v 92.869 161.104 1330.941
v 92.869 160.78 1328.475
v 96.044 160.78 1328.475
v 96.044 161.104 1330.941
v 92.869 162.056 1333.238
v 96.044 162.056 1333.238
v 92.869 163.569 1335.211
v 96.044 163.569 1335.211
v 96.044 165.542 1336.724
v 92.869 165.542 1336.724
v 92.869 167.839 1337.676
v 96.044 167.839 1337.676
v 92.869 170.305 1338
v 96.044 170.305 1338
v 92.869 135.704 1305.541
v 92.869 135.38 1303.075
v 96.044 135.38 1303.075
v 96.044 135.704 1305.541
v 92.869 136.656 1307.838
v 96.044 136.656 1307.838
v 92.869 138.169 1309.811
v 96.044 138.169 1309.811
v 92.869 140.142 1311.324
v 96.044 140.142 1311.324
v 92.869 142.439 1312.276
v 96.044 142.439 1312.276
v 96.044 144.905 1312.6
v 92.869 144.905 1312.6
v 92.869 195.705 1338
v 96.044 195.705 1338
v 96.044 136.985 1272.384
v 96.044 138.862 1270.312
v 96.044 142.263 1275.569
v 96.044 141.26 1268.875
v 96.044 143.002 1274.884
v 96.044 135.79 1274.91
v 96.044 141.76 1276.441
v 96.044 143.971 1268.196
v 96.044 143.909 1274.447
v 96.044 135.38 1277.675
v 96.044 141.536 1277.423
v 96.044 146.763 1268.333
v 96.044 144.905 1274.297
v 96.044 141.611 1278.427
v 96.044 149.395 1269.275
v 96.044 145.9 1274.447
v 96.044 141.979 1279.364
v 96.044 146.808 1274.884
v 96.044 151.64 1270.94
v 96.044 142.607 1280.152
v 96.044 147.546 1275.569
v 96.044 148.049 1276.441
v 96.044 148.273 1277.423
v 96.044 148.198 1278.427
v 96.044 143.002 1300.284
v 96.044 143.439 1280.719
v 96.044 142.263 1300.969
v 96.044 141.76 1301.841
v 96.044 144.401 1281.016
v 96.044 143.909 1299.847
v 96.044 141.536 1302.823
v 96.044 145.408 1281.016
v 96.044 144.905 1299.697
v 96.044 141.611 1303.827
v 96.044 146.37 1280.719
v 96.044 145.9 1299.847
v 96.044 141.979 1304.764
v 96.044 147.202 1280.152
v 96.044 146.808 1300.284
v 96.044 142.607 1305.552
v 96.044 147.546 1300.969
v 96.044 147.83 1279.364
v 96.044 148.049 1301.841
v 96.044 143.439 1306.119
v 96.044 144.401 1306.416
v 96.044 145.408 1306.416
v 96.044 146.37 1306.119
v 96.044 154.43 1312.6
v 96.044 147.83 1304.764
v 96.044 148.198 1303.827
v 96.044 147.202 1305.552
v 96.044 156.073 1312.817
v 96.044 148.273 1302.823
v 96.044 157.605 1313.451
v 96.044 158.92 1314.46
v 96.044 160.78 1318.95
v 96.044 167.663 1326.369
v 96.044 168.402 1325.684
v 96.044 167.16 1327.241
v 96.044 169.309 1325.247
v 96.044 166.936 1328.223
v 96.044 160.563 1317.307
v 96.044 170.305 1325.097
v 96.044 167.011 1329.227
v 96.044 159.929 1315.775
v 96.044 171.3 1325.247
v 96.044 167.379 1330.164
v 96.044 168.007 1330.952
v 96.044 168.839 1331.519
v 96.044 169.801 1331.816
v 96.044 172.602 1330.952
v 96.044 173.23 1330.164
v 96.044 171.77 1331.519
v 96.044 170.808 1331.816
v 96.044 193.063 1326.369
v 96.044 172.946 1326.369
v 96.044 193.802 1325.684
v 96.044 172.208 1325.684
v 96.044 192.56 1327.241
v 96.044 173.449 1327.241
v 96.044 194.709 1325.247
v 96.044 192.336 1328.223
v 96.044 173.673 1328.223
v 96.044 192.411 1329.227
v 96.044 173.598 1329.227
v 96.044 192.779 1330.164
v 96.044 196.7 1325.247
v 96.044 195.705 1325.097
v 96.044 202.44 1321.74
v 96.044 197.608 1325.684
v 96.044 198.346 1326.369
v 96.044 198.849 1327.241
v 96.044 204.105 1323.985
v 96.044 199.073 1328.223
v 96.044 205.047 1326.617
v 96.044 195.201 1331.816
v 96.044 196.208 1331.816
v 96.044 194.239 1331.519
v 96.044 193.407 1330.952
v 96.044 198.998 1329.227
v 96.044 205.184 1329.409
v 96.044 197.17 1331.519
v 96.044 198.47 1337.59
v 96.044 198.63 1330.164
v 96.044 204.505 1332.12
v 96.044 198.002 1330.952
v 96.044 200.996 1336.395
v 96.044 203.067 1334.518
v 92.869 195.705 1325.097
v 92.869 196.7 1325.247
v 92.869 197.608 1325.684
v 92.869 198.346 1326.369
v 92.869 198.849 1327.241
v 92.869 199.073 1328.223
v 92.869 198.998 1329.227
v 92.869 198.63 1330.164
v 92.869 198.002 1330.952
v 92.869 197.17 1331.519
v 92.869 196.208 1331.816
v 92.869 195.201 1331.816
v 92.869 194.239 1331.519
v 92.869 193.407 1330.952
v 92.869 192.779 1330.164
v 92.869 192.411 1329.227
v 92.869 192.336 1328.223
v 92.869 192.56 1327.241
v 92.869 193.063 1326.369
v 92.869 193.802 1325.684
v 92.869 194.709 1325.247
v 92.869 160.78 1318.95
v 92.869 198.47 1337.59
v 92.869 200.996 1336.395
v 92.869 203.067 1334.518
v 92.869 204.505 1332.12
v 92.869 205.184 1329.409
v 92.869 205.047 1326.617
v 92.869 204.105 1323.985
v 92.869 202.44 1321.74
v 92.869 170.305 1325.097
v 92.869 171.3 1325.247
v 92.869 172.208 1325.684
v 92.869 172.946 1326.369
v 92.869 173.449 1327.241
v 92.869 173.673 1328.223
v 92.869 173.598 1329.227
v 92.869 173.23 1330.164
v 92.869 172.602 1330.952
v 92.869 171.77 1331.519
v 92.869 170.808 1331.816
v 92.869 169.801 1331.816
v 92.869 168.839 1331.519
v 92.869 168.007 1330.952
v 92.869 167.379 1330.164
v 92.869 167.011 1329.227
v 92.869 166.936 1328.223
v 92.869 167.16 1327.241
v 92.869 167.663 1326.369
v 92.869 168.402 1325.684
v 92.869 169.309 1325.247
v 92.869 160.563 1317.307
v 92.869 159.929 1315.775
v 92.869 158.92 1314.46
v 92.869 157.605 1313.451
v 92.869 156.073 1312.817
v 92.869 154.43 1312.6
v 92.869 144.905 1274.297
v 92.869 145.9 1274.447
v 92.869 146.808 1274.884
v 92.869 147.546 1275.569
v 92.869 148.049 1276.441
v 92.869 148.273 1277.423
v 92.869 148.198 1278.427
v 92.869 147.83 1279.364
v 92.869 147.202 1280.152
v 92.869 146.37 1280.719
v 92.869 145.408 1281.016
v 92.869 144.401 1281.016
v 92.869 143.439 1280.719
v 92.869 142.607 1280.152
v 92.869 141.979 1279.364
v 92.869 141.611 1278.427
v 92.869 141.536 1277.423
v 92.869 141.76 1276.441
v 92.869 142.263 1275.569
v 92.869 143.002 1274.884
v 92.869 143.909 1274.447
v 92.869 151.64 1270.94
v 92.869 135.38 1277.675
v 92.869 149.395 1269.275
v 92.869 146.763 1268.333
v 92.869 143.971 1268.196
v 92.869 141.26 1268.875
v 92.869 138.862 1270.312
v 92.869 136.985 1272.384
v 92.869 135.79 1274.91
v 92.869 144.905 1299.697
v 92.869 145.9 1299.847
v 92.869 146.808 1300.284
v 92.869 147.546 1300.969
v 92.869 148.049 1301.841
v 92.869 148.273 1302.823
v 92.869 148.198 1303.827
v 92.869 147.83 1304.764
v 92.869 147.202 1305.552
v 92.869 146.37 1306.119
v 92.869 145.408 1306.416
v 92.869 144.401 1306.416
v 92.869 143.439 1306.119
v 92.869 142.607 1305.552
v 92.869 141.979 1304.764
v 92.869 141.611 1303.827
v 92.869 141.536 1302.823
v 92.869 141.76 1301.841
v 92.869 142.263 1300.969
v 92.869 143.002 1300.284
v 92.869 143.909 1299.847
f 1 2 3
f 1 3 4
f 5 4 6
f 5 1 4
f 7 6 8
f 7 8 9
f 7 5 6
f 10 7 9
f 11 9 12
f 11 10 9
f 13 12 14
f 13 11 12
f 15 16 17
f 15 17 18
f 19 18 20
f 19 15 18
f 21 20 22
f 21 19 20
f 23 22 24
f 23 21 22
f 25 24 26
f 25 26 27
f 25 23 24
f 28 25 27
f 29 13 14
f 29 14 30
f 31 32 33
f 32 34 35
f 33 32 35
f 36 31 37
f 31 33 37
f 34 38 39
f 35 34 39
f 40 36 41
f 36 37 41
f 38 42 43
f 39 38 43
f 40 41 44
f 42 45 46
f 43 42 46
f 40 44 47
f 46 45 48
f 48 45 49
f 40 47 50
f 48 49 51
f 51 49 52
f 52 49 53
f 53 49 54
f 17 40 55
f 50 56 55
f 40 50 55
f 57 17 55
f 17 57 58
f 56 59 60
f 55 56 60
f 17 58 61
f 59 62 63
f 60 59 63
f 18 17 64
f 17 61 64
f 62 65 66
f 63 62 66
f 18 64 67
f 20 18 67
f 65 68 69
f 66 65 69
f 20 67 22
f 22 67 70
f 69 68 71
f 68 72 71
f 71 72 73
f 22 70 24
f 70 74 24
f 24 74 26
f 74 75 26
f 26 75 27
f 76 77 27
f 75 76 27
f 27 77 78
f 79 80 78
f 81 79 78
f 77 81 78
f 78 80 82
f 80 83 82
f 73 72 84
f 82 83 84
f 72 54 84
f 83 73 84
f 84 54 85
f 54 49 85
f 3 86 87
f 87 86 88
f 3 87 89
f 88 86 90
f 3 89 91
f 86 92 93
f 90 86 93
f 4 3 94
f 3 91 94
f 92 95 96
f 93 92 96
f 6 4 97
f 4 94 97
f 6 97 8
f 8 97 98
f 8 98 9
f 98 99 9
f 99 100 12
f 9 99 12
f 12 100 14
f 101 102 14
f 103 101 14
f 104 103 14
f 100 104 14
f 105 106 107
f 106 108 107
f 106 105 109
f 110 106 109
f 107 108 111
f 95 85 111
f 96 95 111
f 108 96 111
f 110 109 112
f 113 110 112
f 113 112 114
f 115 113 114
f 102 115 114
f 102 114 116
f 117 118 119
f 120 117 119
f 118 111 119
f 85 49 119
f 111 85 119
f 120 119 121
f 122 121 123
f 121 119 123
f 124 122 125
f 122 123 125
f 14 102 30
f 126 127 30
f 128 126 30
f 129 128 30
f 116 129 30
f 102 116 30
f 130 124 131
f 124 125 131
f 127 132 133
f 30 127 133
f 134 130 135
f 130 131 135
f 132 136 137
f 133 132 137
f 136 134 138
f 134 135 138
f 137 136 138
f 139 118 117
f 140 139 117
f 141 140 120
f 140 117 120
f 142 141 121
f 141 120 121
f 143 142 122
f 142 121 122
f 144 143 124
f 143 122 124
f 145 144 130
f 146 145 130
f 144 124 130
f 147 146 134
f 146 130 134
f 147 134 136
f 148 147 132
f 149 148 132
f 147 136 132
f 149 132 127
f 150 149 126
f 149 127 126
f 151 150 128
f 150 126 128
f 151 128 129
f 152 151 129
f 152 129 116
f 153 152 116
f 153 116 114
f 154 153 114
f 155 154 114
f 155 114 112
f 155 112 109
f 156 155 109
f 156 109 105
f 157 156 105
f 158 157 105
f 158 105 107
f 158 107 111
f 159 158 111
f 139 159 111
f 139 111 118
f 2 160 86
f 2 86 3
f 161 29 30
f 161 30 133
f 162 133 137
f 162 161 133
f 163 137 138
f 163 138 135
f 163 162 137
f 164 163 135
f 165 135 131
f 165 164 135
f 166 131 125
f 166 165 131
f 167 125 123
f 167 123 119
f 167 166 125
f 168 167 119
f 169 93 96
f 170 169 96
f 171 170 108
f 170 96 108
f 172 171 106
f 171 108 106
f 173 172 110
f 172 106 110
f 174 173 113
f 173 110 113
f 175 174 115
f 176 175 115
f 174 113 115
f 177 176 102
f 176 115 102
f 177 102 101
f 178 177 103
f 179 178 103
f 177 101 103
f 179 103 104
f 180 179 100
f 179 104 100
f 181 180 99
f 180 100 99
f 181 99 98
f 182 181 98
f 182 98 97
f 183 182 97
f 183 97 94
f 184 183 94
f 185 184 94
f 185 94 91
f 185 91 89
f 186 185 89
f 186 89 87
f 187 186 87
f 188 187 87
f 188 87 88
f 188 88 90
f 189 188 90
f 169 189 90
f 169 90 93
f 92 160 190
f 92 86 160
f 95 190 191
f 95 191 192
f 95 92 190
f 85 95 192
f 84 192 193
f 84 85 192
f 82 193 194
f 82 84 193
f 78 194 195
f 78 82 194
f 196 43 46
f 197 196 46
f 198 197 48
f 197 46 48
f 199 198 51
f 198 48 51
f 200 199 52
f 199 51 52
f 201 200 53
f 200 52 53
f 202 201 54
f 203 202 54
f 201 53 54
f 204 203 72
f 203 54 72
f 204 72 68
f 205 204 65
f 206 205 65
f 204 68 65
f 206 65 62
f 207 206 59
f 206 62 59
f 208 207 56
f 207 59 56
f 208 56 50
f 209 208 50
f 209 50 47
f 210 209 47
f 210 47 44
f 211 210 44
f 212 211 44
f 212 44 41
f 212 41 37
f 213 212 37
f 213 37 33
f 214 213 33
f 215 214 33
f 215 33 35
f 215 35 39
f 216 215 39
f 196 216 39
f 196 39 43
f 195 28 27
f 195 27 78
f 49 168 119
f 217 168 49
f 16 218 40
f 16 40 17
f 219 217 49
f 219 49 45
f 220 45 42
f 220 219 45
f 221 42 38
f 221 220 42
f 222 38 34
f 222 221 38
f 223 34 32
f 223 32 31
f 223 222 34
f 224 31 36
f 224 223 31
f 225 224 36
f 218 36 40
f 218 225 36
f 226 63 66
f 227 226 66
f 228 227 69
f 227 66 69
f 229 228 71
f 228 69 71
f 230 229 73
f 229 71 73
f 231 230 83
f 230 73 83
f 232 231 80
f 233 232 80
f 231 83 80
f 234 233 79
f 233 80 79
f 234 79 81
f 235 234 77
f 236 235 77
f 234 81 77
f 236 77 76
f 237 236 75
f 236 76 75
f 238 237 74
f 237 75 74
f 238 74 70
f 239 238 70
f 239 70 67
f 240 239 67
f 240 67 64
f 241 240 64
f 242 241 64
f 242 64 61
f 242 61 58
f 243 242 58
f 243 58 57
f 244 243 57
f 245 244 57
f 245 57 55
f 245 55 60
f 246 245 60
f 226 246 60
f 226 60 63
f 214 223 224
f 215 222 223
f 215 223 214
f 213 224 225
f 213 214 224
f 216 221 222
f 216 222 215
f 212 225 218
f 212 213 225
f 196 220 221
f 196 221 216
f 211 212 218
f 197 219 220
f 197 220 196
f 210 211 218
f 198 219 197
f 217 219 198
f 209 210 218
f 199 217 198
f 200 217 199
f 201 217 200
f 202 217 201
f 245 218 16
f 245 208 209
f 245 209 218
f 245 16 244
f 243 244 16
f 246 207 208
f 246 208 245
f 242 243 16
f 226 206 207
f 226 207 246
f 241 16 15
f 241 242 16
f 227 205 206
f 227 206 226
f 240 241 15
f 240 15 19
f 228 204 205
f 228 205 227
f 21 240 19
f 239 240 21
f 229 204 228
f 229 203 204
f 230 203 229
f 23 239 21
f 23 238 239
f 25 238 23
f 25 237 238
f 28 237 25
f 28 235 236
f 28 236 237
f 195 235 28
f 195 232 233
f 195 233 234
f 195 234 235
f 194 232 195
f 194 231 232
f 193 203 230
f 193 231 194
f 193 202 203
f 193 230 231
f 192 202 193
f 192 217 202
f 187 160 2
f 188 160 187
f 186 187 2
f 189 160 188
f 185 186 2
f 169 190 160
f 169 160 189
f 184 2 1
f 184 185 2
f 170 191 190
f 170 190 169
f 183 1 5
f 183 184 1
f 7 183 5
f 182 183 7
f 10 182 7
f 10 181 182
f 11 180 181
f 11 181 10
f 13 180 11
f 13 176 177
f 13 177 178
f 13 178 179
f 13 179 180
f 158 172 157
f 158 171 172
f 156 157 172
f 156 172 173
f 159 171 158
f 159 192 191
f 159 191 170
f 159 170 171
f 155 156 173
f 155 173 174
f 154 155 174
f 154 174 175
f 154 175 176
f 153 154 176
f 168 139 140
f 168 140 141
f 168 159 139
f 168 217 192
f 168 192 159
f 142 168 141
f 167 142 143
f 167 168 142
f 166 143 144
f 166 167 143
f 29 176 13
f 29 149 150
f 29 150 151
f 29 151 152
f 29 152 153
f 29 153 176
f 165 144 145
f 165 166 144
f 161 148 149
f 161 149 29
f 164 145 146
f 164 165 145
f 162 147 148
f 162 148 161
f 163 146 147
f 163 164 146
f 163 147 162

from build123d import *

# Parameters (mm, degrees)
BOSS_EXTRUDE1_START     = 92.868812
BOSS_EXTRUDE1_DEPTH     = 3.175
F_1_4_CLEARANCE_HOLE1_D = 6.7564
FILLET1_R               = 6.35


with BuildPart() as part:
    # Sketch1 → Boss-Extrude1 (new body)
    with BuildSketch(Plane(origin=(0, 0, 0), x_dir=(0, 0, -1), z_dir=(1, 0, 0)).offset(BOSS_EXTRUDE1_START)):
        with BuildLine():
            Line((-1321.740142063, 202.439766645), (-1270.940142063, 151.639766645))
            ThreePointArc((-1270.940142063, 151.639766645), (-1268.875381607, 141.259514861), (-1277.675334154, 135.379574554))
            Line((-1277.675334154, 135.379574554), (-1303.075334154, 135.379574554))
            ThreePointArc((-1303.075334154, 135.379574554), (-1309.810526245, 138.169382463), (-1312.600334154, 144.904574554))
            Line((-1312.600334154, 144.904574554), (-1312.600334154, 160.779574554))
            Line((-1312.600334154, 160.779574554), (-1328.475334154, 160.779574554))
            ThreePointArc((-1328.475334154, 160.779574554), (-1335.210526245, 163.569382463), (-1338.000334154, 170.304574554))
            Line((-1338.000334154, 170.304574554), (-1338.000334154, 195.704574554))
            ThreePointArc((-1338.000334154, 195.704574554), (-1332.120393847, 204.504527101), (-1321.740142063, 202.439766645))
        make_face()
    extrude(amount=BOSS_EXTRUDE1_DEPTH)

    # 1/4 Clearance Hole1 (through all)
    with Locations(Plane.ZY.offset(-92.868812484)):
        with Locations((1328.475334154, 195.704574554), (1328.475334154, 170.304574554), (1277.675334154, 144.904574554), (1303.075334154, 144.904574554)):
            Hole(F_1_4_CLEARANCE_HOLE1_D / 2)

    # Fillet1
    fillet1_edges = [part.edges().sort_by_distance(p)[0] for p in [
        (94.456312, 160.779574554, 1312.600334154),
    ]]
    fillet(fillet1_edges, radius=FILLET1_R)


solid = part.part
